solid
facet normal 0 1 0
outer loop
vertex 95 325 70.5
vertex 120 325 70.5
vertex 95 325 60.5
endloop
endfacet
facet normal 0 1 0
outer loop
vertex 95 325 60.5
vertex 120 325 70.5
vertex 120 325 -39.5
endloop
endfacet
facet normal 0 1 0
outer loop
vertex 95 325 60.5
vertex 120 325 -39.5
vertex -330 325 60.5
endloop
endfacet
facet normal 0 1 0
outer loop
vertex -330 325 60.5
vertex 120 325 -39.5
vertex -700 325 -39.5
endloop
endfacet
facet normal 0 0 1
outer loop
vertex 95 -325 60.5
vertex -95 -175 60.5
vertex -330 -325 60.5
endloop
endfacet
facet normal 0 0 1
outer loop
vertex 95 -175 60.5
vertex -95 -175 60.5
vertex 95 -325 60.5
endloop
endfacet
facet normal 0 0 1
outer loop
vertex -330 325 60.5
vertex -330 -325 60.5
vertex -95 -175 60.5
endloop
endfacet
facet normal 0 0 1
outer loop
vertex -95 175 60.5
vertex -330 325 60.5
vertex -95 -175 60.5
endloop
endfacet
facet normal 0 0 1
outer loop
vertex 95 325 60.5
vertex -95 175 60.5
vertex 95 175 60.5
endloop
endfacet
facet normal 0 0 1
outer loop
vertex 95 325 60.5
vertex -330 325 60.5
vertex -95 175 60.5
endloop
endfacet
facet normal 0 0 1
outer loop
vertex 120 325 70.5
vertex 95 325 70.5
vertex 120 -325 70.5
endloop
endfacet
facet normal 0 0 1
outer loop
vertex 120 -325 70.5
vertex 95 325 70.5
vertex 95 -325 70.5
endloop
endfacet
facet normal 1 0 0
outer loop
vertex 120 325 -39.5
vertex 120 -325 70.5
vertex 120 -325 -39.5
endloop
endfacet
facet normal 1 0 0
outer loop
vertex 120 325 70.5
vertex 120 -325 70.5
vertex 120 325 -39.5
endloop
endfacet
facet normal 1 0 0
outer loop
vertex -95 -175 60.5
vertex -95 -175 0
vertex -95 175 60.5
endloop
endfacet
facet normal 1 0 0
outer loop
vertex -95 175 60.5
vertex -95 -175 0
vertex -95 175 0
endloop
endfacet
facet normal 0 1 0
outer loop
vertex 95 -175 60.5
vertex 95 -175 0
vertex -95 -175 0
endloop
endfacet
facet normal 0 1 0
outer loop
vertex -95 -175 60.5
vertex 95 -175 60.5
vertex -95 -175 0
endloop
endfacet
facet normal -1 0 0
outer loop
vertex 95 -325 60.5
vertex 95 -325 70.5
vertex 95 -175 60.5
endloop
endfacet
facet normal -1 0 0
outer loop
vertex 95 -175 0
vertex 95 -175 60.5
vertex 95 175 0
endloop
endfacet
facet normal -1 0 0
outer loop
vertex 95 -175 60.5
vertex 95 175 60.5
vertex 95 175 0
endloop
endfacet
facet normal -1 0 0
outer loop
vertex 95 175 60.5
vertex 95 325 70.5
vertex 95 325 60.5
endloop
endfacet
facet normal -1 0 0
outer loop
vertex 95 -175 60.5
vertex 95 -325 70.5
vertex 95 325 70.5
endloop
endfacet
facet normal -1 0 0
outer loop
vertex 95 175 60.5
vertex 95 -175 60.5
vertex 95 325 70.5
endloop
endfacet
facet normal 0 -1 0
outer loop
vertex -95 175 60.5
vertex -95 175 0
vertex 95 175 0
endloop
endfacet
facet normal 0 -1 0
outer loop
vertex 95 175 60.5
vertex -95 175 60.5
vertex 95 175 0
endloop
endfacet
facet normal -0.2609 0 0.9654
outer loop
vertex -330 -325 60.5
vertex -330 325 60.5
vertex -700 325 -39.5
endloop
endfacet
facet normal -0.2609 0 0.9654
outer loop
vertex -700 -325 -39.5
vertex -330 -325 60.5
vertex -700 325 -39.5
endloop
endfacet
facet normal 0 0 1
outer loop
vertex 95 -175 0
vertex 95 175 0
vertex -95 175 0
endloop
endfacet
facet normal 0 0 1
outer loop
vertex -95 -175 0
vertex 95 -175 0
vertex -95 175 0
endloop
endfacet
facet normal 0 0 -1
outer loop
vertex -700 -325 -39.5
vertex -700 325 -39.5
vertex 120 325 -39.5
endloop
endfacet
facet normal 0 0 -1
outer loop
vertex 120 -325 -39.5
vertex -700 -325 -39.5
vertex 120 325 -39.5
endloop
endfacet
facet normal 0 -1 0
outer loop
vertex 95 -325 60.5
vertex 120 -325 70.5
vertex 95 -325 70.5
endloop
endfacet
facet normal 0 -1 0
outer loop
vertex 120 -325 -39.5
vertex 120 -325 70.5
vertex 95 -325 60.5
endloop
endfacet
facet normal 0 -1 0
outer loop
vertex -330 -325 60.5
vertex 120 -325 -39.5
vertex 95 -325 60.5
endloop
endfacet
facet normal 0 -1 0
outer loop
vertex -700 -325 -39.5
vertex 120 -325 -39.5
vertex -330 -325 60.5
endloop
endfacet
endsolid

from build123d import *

# Parameters (mm, degrees)
SKETCH1_W           = 190
SKETCH1_H           = 150
BOSS_EXTRUDE1_DEPTH = 60.5
SKETCH3_W           = 60.5
SKETCH3_H           = 150
BOSS_EXTRUDE2_DEPTH = 25
SKETCH4_W           = 450
SKETCH4_H           = 650
BOSS_EXTRUDE3_DEPTH = 39.5
BOSS_EXTRUDE4_DEPTH = 650


with BuildPart() as part:
    # Sketch1 → Boss-Extrude1 (new body)
    with BuildSketch(Plane.XY):
        with Locations((0, 250)):
            Rectangle(SKETCH1_W, SKETCH1_H)
        Polygon((-95, -175), (-95, 175), (-95, 325), (-330, 325), (-330, -325), (95, -325), (95, -175), align=None)
    extrude(amount=BOSS_EXTRUDE1_DEPTH)

    # Sketch3 → Boss-Extrude2 (add)
    with BuildSketch(Plane(origin=(95, 0, 0), x_dir=(0, 0, -1), z_dir=(1, 0, 0))):
        Polygon((-70.5, -325), (0, -325), (0, 175), (-60.5, 175), (-60.5, 325), (-70.5, 325), align=None)
        with Locations((-30.25, 250)):
            Rectangle(SKETCH3_W, SKETCH3_H)
    extrude(amount=BOSS_EXTRUDE2_DEPTH)

    # Sketch4 → Boss-Extrude3 (add)
    with BuildSketch(Plane(origin=(0, 0, 0), x_dir=(-1, 0, 0), z_dir=(0, 0, -1))):
        with Locations((105, 0)):
            Rectangle(SKETCH4_W, SKETCH4_H)
    extrude(amount=BOSS_EXTRUDE3_DEPTH)

    # Sketch8 → Boss-Extrude4 (add)
    with BuildSketch(Plane(origin=(0, 325, 0), x_dir=(1, 0, 0), z_dir=(0, 1, 0))):
        Polygon((-330, -60.5), (-700, 39.5), (-330, 39.5), align=None)
    extrude(amount=-BOSS_EXTRUDE4_DEPTH)


solid = part.part
